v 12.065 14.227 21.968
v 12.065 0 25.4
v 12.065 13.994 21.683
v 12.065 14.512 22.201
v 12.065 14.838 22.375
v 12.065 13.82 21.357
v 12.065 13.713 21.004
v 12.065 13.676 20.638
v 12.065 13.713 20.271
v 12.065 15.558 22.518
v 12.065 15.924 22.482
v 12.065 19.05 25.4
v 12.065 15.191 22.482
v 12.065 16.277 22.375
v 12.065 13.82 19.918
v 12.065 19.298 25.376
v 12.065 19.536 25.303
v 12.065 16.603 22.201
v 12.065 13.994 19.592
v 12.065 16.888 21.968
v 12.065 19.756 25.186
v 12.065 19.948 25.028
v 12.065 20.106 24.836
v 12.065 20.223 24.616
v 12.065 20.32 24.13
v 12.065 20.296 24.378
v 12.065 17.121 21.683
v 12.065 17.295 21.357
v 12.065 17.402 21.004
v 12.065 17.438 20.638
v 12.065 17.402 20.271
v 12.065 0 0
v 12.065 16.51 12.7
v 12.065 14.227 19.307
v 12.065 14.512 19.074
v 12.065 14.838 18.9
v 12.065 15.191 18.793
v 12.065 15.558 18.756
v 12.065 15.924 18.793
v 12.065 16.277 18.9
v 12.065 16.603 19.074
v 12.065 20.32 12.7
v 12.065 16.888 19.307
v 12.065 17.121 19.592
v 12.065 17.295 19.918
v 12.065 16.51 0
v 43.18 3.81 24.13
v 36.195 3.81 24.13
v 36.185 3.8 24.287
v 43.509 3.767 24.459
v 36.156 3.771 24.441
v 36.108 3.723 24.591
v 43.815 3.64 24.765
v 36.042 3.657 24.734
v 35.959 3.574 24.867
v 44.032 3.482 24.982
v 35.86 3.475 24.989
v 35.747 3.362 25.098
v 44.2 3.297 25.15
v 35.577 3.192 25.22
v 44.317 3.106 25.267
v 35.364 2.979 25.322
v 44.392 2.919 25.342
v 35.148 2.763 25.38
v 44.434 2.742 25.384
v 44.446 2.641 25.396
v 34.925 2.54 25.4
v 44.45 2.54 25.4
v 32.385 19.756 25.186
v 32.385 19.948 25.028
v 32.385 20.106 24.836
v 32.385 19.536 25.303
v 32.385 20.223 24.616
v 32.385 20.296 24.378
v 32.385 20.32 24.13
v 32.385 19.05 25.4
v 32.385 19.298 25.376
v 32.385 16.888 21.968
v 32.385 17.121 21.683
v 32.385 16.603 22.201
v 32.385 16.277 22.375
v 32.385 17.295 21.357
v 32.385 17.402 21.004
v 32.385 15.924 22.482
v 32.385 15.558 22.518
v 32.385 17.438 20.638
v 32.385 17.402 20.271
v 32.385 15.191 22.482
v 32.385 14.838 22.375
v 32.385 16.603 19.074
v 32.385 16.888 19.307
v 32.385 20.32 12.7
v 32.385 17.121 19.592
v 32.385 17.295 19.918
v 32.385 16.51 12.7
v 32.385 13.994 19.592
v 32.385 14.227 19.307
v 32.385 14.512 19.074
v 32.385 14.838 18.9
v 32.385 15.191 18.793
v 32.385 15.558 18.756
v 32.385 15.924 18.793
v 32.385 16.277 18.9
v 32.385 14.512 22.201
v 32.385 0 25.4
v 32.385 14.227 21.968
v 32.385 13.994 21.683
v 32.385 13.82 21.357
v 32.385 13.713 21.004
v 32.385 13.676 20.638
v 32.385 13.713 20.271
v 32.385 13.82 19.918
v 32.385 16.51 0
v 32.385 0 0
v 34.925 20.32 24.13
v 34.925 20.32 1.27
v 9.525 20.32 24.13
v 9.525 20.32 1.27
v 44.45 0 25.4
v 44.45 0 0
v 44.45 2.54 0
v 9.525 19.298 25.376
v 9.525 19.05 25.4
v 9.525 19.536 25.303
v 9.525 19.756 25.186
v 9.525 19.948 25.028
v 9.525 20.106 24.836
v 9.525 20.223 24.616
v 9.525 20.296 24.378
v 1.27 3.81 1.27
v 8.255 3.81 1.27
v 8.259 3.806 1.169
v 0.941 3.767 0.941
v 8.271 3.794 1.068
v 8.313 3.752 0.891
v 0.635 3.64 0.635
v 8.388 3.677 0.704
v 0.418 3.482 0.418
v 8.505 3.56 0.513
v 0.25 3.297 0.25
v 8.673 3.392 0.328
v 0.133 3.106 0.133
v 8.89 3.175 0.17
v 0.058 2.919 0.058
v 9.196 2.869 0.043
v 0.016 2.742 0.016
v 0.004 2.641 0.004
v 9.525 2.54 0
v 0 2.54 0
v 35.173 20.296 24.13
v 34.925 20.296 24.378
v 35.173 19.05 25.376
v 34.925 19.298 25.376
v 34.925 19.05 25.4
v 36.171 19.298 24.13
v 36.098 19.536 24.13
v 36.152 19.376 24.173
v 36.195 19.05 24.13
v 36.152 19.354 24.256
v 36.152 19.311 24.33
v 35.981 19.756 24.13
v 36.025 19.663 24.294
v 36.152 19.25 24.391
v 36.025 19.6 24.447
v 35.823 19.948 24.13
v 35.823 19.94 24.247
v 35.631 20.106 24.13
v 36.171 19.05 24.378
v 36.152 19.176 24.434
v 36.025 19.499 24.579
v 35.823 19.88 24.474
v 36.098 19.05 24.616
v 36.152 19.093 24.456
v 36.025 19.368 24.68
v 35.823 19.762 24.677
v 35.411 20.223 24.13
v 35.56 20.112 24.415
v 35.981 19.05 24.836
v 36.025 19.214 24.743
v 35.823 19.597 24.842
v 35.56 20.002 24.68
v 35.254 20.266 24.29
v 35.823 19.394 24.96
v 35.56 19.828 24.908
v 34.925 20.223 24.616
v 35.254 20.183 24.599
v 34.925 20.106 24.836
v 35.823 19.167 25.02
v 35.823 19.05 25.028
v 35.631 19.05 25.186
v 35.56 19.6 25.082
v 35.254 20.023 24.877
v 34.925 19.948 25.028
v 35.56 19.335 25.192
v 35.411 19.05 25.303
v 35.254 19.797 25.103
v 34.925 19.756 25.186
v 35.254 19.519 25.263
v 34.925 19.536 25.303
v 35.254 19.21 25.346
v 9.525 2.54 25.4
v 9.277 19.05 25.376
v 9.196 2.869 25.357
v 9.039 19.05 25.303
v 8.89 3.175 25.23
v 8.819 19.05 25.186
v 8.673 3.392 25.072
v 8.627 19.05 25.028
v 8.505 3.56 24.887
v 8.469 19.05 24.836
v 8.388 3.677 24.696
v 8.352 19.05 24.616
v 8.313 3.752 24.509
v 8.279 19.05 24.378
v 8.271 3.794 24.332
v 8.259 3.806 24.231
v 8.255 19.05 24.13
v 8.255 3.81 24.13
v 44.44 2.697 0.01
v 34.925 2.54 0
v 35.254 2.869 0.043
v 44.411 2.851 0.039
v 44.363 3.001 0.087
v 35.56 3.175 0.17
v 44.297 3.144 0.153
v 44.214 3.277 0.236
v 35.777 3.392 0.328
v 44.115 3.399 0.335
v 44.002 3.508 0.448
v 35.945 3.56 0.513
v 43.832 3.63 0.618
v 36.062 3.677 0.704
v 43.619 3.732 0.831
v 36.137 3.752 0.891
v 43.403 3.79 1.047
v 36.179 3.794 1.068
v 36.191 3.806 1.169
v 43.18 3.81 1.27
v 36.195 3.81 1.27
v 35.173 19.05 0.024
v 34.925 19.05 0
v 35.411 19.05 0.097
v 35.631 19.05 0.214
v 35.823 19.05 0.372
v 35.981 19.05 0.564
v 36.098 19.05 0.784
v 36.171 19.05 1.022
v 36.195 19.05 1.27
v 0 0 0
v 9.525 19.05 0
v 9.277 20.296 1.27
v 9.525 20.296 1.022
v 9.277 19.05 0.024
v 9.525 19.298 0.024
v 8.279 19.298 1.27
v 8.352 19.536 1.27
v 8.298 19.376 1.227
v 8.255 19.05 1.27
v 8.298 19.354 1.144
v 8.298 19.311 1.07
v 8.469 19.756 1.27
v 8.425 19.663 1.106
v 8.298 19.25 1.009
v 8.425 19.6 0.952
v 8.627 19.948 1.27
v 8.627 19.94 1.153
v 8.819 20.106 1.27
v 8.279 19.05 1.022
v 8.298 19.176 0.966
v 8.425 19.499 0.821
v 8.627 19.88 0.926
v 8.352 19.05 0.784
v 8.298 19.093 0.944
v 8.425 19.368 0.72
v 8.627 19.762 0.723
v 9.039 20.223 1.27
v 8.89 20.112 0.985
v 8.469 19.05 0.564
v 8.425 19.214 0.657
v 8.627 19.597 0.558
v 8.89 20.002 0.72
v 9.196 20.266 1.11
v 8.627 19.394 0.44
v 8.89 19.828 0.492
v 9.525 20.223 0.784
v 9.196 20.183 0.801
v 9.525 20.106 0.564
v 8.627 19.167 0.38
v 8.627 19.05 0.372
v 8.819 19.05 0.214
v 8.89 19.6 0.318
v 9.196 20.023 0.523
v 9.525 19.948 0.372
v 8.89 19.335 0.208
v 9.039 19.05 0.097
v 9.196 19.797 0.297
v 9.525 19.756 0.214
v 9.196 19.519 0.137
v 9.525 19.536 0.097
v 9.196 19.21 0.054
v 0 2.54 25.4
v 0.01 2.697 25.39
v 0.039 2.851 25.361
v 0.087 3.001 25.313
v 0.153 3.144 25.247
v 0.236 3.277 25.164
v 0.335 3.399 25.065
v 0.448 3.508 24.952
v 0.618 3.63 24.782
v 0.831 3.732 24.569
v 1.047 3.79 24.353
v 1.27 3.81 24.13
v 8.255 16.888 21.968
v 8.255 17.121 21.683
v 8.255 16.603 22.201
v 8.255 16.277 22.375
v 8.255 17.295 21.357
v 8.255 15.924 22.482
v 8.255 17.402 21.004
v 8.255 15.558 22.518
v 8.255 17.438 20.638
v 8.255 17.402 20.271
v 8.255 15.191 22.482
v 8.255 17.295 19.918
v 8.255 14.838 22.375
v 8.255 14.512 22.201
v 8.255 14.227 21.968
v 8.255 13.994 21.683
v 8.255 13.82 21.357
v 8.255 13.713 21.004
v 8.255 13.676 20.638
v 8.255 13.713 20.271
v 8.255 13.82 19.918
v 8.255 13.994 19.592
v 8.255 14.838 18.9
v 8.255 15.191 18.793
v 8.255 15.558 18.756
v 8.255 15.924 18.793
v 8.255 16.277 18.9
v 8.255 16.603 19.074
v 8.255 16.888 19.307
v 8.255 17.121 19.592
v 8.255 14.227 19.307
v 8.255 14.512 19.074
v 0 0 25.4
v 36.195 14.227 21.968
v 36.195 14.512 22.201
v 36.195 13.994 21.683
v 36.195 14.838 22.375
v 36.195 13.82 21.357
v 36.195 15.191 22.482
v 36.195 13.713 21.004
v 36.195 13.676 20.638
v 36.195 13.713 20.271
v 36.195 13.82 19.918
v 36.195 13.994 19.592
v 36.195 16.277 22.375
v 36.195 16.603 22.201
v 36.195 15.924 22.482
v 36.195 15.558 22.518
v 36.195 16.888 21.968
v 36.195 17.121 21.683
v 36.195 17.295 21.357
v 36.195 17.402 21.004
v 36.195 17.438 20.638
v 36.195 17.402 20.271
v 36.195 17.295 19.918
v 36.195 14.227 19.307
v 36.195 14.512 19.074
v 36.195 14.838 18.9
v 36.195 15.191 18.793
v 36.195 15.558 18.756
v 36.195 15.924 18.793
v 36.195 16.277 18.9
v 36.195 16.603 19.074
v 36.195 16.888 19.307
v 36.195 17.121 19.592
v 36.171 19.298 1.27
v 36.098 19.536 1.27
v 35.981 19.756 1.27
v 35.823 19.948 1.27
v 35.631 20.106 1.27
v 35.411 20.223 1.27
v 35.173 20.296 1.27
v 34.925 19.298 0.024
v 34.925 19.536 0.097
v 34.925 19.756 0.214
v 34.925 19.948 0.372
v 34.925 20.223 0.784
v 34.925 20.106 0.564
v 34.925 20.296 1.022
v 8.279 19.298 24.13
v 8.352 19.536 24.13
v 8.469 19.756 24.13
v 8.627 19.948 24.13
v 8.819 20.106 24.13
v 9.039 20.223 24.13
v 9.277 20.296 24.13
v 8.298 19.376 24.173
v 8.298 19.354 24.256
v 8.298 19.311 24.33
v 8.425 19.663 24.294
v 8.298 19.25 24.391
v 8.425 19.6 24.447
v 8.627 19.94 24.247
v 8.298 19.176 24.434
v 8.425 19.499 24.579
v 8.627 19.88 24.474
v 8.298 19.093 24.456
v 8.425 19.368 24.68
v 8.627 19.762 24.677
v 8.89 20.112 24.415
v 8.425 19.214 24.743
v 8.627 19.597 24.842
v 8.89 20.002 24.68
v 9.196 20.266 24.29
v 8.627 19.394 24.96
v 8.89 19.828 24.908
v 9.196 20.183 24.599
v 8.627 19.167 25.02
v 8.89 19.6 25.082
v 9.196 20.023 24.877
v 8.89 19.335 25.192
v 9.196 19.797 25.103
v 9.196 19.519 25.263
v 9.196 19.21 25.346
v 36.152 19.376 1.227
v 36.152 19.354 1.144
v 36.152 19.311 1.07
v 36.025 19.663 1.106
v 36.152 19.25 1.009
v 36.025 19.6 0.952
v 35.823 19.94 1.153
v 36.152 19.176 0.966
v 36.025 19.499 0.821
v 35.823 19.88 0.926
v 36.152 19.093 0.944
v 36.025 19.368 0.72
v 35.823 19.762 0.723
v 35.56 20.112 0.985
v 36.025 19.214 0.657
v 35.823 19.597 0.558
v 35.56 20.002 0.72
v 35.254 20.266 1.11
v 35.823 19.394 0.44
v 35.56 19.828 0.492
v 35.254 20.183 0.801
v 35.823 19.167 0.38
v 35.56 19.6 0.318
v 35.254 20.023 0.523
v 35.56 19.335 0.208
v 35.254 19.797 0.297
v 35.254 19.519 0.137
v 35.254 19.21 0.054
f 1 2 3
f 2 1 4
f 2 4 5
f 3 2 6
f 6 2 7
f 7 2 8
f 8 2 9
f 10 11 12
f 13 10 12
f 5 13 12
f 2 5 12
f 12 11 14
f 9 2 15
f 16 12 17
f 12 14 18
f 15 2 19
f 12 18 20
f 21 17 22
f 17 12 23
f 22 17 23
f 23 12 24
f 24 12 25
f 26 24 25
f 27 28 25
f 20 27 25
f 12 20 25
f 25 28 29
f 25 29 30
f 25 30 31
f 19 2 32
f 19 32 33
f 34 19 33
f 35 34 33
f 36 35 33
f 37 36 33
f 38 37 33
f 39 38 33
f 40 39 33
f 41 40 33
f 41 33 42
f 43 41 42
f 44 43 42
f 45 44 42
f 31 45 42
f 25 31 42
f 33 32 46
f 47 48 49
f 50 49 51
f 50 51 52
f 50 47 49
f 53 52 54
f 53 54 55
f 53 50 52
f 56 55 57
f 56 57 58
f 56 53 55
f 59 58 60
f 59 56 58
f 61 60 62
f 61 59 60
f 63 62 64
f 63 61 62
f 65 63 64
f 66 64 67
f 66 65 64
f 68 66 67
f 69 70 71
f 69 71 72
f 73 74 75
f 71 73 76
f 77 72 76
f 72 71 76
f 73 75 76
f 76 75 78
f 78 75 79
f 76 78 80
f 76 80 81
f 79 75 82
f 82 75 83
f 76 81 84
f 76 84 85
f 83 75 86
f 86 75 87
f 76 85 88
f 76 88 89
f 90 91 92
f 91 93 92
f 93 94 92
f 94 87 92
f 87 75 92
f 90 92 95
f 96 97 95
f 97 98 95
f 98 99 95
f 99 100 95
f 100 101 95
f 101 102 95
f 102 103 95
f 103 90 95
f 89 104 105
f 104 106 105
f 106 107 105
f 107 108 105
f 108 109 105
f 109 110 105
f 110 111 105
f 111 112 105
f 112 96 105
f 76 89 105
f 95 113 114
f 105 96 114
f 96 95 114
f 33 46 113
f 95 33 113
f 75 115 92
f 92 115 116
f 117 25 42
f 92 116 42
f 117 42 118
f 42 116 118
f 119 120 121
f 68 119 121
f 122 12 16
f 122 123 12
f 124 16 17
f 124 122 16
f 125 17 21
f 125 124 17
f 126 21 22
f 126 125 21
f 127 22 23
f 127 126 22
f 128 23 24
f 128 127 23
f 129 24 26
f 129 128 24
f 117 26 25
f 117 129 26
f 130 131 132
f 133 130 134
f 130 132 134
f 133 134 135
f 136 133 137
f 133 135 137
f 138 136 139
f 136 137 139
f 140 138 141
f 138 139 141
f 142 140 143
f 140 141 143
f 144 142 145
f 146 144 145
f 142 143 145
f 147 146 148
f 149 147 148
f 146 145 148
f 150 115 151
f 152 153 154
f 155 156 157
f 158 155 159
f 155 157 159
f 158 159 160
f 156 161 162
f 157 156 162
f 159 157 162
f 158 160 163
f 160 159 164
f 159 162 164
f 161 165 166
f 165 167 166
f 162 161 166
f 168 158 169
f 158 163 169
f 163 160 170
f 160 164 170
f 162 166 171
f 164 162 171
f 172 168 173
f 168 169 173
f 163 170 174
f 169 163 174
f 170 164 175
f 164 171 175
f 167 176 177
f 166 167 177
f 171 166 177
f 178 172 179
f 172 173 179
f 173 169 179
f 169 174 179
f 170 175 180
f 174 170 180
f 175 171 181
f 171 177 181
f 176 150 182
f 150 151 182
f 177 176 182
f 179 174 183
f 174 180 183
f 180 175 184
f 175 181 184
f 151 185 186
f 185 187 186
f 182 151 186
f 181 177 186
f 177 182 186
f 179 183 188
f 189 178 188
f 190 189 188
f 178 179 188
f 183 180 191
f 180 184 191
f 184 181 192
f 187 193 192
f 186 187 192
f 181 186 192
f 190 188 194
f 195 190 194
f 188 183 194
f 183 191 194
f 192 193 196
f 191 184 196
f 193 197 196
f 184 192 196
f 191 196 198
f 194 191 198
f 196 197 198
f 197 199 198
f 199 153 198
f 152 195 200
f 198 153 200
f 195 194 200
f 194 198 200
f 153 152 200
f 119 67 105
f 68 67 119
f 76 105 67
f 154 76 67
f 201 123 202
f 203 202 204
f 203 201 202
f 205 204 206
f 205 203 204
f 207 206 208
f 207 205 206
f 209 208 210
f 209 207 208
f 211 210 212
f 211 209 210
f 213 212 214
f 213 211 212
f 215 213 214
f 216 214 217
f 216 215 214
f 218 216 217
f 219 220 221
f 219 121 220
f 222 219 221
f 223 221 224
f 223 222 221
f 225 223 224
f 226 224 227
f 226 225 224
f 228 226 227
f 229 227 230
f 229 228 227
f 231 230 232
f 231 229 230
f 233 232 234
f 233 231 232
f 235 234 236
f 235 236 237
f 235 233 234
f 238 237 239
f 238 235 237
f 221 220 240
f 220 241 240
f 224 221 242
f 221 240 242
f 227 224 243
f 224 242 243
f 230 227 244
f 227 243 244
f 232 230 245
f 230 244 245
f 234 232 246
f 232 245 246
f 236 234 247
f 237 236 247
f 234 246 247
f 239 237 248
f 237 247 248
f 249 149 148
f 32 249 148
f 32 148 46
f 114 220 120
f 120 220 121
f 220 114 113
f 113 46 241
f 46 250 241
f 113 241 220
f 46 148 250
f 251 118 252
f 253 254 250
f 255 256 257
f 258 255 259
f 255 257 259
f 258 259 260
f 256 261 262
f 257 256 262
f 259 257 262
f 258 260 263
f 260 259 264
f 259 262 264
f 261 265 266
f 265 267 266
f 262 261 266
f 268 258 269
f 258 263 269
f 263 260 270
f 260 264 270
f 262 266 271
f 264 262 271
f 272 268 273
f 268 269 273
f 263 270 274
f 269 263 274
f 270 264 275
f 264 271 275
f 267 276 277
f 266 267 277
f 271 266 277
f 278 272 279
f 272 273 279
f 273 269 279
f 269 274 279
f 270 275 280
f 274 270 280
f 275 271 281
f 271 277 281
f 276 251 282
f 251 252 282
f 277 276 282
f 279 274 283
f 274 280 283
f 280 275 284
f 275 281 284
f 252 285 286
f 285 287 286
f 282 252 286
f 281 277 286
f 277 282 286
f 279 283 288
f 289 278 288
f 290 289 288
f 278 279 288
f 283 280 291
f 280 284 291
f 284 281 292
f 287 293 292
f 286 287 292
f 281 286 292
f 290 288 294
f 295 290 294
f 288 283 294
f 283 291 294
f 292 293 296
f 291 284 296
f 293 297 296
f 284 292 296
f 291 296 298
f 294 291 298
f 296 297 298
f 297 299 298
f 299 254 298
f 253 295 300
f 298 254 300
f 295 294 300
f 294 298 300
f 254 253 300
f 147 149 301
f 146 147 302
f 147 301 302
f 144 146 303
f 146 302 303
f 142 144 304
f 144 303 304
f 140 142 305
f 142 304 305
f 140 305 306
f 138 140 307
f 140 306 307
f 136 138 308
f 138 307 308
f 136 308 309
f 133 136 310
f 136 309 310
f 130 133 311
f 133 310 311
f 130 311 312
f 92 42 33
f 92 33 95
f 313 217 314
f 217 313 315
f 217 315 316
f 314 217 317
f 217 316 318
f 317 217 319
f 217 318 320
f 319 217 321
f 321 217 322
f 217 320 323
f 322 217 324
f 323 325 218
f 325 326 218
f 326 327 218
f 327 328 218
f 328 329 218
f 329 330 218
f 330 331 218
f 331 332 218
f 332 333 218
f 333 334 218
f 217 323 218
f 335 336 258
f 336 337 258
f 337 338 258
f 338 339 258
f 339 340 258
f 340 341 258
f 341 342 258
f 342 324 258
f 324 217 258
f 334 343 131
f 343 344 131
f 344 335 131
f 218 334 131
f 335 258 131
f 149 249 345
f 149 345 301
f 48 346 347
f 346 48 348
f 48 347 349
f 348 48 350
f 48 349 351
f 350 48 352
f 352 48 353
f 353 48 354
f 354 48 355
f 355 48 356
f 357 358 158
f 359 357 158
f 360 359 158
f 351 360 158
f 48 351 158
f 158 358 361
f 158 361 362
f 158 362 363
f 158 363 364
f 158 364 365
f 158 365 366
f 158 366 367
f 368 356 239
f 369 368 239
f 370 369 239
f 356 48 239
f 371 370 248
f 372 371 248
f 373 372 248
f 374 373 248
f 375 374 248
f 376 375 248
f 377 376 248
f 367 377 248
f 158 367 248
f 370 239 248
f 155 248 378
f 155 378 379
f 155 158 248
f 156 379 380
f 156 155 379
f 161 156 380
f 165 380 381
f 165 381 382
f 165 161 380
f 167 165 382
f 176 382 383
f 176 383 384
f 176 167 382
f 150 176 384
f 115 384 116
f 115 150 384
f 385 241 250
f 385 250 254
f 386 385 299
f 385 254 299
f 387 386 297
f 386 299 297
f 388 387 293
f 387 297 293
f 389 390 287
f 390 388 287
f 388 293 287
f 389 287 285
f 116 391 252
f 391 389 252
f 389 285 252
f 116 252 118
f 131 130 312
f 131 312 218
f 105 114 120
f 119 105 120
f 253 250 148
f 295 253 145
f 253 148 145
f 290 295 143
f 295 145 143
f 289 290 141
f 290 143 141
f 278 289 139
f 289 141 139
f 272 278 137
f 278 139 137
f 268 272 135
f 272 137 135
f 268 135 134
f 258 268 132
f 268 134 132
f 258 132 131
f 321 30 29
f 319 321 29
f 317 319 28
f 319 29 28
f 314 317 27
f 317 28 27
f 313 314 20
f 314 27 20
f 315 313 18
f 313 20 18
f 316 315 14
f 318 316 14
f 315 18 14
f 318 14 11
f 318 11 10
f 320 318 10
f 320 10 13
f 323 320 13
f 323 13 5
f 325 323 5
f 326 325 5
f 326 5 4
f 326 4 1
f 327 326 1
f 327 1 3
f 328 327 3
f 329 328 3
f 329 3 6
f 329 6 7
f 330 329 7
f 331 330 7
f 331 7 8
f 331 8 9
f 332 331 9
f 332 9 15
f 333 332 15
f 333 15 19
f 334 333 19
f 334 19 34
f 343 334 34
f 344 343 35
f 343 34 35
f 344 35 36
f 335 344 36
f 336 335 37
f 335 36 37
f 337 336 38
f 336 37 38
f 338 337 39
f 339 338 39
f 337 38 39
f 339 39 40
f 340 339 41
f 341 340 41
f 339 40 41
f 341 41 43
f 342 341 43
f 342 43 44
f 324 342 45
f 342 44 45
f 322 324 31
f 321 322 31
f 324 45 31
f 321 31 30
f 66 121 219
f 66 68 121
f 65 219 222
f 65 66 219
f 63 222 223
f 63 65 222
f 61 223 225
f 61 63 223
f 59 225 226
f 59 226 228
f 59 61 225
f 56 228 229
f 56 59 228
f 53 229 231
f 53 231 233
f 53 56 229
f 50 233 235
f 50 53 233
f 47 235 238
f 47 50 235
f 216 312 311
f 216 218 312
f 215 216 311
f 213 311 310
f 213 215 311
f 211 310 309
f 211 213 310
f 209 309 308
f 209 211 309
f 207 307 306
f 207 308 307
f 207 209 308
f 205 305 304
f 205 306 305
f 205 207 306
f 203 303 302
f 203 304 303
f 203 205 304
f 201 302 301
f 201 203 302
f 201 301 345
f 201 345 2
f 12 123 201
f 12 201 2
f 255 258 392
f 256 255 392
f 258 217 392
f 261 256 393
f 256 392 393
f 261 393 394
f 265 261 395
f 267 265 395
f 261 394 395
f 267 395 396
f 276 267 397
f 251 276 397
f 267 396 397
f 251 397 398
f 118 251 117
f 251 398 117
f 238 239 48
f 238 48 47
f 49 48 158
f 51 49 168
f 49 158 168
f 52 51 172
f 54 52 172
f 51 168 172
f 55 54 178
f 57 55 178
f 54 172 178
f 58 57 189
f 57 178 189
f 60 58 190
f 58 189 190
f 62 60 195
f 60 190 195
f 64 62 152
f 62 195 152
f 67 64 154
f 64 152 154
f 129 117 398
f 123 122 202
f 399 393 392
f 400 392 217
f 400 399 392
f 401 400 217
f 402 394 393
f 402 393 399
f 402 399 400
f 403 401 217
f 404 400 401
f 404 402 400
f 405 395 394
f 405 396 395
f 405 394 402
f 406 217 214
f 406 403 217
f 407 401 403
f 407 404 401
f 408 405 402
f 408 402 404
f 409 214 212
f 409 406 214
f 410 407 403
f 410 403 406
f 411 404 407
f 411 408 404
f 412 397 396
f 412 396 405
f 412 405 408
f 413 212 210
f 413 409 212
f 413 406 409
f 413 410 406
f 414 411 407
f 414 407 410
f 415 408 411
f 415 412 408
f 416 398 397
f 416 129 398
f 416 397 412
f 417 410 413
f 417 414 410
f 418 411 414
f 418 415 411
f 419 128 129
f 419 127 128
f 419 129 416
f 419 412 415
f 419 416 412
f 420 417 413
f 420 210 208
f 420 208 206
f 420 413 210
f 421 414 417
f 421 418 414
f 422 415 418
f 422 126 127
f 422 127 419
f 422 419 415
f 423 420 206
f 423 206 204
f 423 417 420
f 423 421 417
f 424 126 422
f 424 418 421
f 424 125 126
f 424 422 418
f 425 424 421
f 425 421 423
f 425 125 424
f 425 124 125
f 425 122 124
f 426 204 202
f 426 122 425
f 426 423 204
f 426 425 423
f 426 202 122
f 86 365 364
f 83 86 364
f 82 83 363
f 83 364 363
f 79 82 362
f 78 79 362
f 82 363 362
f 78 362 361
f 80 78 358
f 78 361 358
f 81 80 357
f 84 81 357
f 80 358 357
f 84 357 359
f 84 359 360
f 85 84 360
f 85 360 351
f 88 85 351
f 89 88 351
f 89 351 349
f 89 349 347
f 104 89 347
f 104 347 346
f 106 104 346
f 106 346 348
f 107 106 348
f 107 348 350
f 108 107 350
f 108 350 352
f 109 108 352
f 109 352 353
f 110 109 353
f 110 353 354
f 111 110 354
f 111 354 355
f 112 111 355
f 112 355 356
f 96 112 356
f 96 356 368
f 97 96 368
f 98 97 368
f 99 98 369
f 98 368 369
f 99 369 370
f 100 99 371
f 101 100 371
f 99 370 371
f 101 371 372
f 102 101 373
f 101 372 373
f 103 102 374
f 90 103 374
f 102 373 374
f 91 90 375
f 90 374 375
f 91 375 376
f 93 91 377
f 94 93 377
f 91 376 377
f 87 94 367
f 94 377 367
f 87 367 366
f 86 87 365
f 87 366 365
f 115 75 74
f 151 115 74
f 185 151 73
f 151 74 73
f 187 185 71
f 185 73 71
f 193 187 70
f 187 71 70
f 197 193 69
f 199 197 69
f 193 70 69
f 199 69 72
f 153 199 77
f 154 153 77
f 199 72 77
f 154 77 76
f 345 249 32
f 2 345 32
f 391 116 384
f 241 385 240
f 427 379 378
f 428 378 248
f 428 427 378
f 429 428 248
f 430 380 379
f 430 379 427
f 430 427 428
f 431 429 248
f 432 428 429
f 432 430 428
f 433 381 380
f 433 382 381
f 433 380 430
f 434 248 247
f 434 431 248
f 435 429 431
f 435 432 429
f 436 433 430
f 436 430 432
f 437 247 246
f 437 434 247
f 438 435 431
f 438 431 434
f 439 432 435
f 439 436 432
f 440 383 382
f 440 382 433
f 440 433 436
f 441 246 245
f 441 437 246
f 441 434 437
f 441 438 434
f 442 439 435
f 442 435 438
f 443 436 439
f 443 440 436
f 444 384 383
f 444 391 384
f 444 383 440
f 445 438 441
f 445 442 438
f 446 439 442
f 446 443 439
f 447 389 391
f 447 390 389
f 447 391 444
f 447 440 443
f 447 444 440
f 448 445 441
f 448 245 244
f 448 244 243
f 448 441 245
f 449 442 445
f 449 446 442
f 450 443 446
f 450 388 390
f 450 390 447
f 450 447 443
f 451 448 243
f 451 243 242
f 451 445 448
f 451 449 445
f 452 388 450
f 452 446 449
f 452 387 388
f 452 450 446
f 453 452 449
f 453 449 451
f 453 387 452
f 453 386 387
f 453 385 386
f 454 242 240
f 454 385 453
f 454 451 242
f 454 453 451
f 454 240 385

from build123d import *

# Parameters (mm, degrees)
F0_W     = 8.255
F0_H     = 3.81
F1_DEPTH = 25.4
F2_W     = 20.32
F2_H     = 3.81
F3_DEPTH = 12.7
F4_R     = 1.881
F5_DEPTH = 36.196
F6_R     = 1.27


with BuildPart() as f1:
    # F0 (on Top) → F1 (new body)
    with BuildSketch(Plane.XY):
        with Locations((4.1275, 1.905)):
            Rectangle(F0_W, F0_H)
        Polygon((8.255, 3.81), (8.255, 0), (12.065, 0), (12.065, 16.51), (8.255, 16.51), align=None)
        Polygon((8.255, 20.32), (8.255, 16.51), (12.065, 16.51), (32.385, 16.51), (36.195, 16.51), (36.195, 20.32), align=None)
        Polygon((36.195, 16.51), (32.385, 16.51), (32.385, 0), (36.195, 0), (36.195, 3.81), align=None)
        with Locations((40.3225, 1.905)):
            Rectangle(F0_W, F0_H)
    extrude(amount=F1_DEPTH)

    # F2 (on face) → F3 (cut)
    with BuildSketch(Plane.XY.offset(25.4)):
        with Locations((22.225, 18.415)):
            Rectangle(F2_W, F2_H)
    extrude(amount=-F3_DEPTH, mode=Mode.SUBTRACT)

    # F4 (on face) → F5 (cut, through all)
    with BuildSketch(Plane.YZ.offset(36.195)):
        with Locations((15.5575, 20.6375)):
            Circle(F4_R)
    extrude(amount=-F5_DEPTH, mode=Mode.SUBTRACT)

    # F6
    f6_edges = [f1.edges().sort_by_distance(p)[0] for p in [
        (10.16, 20.32, 25.4),
        (34.29, 20.32, 25.4),
        (22.225, 20.32, 0),
        (36.195, 20.32, 12.7),
        (8.255, 20.32, 12.7),
        (36.195, 12.065, 25.4),
        (8.255, 12.065, 25.4),
        (36.195, 12.065, 0),
        (8.255, 12.065, 0),
        (4.1275, 3.81, 0),
        (0, 3.81, 12.7),
        (4.1275, 3.81, 25.4),
        (40.3225, 3.81, 25.4),
        (44.45, 3.81, 12.7),
        (40.3225, 3.81, 0),
    ]]
    fillet(f6_edges, radius=F6_R)


solid = f1.part
